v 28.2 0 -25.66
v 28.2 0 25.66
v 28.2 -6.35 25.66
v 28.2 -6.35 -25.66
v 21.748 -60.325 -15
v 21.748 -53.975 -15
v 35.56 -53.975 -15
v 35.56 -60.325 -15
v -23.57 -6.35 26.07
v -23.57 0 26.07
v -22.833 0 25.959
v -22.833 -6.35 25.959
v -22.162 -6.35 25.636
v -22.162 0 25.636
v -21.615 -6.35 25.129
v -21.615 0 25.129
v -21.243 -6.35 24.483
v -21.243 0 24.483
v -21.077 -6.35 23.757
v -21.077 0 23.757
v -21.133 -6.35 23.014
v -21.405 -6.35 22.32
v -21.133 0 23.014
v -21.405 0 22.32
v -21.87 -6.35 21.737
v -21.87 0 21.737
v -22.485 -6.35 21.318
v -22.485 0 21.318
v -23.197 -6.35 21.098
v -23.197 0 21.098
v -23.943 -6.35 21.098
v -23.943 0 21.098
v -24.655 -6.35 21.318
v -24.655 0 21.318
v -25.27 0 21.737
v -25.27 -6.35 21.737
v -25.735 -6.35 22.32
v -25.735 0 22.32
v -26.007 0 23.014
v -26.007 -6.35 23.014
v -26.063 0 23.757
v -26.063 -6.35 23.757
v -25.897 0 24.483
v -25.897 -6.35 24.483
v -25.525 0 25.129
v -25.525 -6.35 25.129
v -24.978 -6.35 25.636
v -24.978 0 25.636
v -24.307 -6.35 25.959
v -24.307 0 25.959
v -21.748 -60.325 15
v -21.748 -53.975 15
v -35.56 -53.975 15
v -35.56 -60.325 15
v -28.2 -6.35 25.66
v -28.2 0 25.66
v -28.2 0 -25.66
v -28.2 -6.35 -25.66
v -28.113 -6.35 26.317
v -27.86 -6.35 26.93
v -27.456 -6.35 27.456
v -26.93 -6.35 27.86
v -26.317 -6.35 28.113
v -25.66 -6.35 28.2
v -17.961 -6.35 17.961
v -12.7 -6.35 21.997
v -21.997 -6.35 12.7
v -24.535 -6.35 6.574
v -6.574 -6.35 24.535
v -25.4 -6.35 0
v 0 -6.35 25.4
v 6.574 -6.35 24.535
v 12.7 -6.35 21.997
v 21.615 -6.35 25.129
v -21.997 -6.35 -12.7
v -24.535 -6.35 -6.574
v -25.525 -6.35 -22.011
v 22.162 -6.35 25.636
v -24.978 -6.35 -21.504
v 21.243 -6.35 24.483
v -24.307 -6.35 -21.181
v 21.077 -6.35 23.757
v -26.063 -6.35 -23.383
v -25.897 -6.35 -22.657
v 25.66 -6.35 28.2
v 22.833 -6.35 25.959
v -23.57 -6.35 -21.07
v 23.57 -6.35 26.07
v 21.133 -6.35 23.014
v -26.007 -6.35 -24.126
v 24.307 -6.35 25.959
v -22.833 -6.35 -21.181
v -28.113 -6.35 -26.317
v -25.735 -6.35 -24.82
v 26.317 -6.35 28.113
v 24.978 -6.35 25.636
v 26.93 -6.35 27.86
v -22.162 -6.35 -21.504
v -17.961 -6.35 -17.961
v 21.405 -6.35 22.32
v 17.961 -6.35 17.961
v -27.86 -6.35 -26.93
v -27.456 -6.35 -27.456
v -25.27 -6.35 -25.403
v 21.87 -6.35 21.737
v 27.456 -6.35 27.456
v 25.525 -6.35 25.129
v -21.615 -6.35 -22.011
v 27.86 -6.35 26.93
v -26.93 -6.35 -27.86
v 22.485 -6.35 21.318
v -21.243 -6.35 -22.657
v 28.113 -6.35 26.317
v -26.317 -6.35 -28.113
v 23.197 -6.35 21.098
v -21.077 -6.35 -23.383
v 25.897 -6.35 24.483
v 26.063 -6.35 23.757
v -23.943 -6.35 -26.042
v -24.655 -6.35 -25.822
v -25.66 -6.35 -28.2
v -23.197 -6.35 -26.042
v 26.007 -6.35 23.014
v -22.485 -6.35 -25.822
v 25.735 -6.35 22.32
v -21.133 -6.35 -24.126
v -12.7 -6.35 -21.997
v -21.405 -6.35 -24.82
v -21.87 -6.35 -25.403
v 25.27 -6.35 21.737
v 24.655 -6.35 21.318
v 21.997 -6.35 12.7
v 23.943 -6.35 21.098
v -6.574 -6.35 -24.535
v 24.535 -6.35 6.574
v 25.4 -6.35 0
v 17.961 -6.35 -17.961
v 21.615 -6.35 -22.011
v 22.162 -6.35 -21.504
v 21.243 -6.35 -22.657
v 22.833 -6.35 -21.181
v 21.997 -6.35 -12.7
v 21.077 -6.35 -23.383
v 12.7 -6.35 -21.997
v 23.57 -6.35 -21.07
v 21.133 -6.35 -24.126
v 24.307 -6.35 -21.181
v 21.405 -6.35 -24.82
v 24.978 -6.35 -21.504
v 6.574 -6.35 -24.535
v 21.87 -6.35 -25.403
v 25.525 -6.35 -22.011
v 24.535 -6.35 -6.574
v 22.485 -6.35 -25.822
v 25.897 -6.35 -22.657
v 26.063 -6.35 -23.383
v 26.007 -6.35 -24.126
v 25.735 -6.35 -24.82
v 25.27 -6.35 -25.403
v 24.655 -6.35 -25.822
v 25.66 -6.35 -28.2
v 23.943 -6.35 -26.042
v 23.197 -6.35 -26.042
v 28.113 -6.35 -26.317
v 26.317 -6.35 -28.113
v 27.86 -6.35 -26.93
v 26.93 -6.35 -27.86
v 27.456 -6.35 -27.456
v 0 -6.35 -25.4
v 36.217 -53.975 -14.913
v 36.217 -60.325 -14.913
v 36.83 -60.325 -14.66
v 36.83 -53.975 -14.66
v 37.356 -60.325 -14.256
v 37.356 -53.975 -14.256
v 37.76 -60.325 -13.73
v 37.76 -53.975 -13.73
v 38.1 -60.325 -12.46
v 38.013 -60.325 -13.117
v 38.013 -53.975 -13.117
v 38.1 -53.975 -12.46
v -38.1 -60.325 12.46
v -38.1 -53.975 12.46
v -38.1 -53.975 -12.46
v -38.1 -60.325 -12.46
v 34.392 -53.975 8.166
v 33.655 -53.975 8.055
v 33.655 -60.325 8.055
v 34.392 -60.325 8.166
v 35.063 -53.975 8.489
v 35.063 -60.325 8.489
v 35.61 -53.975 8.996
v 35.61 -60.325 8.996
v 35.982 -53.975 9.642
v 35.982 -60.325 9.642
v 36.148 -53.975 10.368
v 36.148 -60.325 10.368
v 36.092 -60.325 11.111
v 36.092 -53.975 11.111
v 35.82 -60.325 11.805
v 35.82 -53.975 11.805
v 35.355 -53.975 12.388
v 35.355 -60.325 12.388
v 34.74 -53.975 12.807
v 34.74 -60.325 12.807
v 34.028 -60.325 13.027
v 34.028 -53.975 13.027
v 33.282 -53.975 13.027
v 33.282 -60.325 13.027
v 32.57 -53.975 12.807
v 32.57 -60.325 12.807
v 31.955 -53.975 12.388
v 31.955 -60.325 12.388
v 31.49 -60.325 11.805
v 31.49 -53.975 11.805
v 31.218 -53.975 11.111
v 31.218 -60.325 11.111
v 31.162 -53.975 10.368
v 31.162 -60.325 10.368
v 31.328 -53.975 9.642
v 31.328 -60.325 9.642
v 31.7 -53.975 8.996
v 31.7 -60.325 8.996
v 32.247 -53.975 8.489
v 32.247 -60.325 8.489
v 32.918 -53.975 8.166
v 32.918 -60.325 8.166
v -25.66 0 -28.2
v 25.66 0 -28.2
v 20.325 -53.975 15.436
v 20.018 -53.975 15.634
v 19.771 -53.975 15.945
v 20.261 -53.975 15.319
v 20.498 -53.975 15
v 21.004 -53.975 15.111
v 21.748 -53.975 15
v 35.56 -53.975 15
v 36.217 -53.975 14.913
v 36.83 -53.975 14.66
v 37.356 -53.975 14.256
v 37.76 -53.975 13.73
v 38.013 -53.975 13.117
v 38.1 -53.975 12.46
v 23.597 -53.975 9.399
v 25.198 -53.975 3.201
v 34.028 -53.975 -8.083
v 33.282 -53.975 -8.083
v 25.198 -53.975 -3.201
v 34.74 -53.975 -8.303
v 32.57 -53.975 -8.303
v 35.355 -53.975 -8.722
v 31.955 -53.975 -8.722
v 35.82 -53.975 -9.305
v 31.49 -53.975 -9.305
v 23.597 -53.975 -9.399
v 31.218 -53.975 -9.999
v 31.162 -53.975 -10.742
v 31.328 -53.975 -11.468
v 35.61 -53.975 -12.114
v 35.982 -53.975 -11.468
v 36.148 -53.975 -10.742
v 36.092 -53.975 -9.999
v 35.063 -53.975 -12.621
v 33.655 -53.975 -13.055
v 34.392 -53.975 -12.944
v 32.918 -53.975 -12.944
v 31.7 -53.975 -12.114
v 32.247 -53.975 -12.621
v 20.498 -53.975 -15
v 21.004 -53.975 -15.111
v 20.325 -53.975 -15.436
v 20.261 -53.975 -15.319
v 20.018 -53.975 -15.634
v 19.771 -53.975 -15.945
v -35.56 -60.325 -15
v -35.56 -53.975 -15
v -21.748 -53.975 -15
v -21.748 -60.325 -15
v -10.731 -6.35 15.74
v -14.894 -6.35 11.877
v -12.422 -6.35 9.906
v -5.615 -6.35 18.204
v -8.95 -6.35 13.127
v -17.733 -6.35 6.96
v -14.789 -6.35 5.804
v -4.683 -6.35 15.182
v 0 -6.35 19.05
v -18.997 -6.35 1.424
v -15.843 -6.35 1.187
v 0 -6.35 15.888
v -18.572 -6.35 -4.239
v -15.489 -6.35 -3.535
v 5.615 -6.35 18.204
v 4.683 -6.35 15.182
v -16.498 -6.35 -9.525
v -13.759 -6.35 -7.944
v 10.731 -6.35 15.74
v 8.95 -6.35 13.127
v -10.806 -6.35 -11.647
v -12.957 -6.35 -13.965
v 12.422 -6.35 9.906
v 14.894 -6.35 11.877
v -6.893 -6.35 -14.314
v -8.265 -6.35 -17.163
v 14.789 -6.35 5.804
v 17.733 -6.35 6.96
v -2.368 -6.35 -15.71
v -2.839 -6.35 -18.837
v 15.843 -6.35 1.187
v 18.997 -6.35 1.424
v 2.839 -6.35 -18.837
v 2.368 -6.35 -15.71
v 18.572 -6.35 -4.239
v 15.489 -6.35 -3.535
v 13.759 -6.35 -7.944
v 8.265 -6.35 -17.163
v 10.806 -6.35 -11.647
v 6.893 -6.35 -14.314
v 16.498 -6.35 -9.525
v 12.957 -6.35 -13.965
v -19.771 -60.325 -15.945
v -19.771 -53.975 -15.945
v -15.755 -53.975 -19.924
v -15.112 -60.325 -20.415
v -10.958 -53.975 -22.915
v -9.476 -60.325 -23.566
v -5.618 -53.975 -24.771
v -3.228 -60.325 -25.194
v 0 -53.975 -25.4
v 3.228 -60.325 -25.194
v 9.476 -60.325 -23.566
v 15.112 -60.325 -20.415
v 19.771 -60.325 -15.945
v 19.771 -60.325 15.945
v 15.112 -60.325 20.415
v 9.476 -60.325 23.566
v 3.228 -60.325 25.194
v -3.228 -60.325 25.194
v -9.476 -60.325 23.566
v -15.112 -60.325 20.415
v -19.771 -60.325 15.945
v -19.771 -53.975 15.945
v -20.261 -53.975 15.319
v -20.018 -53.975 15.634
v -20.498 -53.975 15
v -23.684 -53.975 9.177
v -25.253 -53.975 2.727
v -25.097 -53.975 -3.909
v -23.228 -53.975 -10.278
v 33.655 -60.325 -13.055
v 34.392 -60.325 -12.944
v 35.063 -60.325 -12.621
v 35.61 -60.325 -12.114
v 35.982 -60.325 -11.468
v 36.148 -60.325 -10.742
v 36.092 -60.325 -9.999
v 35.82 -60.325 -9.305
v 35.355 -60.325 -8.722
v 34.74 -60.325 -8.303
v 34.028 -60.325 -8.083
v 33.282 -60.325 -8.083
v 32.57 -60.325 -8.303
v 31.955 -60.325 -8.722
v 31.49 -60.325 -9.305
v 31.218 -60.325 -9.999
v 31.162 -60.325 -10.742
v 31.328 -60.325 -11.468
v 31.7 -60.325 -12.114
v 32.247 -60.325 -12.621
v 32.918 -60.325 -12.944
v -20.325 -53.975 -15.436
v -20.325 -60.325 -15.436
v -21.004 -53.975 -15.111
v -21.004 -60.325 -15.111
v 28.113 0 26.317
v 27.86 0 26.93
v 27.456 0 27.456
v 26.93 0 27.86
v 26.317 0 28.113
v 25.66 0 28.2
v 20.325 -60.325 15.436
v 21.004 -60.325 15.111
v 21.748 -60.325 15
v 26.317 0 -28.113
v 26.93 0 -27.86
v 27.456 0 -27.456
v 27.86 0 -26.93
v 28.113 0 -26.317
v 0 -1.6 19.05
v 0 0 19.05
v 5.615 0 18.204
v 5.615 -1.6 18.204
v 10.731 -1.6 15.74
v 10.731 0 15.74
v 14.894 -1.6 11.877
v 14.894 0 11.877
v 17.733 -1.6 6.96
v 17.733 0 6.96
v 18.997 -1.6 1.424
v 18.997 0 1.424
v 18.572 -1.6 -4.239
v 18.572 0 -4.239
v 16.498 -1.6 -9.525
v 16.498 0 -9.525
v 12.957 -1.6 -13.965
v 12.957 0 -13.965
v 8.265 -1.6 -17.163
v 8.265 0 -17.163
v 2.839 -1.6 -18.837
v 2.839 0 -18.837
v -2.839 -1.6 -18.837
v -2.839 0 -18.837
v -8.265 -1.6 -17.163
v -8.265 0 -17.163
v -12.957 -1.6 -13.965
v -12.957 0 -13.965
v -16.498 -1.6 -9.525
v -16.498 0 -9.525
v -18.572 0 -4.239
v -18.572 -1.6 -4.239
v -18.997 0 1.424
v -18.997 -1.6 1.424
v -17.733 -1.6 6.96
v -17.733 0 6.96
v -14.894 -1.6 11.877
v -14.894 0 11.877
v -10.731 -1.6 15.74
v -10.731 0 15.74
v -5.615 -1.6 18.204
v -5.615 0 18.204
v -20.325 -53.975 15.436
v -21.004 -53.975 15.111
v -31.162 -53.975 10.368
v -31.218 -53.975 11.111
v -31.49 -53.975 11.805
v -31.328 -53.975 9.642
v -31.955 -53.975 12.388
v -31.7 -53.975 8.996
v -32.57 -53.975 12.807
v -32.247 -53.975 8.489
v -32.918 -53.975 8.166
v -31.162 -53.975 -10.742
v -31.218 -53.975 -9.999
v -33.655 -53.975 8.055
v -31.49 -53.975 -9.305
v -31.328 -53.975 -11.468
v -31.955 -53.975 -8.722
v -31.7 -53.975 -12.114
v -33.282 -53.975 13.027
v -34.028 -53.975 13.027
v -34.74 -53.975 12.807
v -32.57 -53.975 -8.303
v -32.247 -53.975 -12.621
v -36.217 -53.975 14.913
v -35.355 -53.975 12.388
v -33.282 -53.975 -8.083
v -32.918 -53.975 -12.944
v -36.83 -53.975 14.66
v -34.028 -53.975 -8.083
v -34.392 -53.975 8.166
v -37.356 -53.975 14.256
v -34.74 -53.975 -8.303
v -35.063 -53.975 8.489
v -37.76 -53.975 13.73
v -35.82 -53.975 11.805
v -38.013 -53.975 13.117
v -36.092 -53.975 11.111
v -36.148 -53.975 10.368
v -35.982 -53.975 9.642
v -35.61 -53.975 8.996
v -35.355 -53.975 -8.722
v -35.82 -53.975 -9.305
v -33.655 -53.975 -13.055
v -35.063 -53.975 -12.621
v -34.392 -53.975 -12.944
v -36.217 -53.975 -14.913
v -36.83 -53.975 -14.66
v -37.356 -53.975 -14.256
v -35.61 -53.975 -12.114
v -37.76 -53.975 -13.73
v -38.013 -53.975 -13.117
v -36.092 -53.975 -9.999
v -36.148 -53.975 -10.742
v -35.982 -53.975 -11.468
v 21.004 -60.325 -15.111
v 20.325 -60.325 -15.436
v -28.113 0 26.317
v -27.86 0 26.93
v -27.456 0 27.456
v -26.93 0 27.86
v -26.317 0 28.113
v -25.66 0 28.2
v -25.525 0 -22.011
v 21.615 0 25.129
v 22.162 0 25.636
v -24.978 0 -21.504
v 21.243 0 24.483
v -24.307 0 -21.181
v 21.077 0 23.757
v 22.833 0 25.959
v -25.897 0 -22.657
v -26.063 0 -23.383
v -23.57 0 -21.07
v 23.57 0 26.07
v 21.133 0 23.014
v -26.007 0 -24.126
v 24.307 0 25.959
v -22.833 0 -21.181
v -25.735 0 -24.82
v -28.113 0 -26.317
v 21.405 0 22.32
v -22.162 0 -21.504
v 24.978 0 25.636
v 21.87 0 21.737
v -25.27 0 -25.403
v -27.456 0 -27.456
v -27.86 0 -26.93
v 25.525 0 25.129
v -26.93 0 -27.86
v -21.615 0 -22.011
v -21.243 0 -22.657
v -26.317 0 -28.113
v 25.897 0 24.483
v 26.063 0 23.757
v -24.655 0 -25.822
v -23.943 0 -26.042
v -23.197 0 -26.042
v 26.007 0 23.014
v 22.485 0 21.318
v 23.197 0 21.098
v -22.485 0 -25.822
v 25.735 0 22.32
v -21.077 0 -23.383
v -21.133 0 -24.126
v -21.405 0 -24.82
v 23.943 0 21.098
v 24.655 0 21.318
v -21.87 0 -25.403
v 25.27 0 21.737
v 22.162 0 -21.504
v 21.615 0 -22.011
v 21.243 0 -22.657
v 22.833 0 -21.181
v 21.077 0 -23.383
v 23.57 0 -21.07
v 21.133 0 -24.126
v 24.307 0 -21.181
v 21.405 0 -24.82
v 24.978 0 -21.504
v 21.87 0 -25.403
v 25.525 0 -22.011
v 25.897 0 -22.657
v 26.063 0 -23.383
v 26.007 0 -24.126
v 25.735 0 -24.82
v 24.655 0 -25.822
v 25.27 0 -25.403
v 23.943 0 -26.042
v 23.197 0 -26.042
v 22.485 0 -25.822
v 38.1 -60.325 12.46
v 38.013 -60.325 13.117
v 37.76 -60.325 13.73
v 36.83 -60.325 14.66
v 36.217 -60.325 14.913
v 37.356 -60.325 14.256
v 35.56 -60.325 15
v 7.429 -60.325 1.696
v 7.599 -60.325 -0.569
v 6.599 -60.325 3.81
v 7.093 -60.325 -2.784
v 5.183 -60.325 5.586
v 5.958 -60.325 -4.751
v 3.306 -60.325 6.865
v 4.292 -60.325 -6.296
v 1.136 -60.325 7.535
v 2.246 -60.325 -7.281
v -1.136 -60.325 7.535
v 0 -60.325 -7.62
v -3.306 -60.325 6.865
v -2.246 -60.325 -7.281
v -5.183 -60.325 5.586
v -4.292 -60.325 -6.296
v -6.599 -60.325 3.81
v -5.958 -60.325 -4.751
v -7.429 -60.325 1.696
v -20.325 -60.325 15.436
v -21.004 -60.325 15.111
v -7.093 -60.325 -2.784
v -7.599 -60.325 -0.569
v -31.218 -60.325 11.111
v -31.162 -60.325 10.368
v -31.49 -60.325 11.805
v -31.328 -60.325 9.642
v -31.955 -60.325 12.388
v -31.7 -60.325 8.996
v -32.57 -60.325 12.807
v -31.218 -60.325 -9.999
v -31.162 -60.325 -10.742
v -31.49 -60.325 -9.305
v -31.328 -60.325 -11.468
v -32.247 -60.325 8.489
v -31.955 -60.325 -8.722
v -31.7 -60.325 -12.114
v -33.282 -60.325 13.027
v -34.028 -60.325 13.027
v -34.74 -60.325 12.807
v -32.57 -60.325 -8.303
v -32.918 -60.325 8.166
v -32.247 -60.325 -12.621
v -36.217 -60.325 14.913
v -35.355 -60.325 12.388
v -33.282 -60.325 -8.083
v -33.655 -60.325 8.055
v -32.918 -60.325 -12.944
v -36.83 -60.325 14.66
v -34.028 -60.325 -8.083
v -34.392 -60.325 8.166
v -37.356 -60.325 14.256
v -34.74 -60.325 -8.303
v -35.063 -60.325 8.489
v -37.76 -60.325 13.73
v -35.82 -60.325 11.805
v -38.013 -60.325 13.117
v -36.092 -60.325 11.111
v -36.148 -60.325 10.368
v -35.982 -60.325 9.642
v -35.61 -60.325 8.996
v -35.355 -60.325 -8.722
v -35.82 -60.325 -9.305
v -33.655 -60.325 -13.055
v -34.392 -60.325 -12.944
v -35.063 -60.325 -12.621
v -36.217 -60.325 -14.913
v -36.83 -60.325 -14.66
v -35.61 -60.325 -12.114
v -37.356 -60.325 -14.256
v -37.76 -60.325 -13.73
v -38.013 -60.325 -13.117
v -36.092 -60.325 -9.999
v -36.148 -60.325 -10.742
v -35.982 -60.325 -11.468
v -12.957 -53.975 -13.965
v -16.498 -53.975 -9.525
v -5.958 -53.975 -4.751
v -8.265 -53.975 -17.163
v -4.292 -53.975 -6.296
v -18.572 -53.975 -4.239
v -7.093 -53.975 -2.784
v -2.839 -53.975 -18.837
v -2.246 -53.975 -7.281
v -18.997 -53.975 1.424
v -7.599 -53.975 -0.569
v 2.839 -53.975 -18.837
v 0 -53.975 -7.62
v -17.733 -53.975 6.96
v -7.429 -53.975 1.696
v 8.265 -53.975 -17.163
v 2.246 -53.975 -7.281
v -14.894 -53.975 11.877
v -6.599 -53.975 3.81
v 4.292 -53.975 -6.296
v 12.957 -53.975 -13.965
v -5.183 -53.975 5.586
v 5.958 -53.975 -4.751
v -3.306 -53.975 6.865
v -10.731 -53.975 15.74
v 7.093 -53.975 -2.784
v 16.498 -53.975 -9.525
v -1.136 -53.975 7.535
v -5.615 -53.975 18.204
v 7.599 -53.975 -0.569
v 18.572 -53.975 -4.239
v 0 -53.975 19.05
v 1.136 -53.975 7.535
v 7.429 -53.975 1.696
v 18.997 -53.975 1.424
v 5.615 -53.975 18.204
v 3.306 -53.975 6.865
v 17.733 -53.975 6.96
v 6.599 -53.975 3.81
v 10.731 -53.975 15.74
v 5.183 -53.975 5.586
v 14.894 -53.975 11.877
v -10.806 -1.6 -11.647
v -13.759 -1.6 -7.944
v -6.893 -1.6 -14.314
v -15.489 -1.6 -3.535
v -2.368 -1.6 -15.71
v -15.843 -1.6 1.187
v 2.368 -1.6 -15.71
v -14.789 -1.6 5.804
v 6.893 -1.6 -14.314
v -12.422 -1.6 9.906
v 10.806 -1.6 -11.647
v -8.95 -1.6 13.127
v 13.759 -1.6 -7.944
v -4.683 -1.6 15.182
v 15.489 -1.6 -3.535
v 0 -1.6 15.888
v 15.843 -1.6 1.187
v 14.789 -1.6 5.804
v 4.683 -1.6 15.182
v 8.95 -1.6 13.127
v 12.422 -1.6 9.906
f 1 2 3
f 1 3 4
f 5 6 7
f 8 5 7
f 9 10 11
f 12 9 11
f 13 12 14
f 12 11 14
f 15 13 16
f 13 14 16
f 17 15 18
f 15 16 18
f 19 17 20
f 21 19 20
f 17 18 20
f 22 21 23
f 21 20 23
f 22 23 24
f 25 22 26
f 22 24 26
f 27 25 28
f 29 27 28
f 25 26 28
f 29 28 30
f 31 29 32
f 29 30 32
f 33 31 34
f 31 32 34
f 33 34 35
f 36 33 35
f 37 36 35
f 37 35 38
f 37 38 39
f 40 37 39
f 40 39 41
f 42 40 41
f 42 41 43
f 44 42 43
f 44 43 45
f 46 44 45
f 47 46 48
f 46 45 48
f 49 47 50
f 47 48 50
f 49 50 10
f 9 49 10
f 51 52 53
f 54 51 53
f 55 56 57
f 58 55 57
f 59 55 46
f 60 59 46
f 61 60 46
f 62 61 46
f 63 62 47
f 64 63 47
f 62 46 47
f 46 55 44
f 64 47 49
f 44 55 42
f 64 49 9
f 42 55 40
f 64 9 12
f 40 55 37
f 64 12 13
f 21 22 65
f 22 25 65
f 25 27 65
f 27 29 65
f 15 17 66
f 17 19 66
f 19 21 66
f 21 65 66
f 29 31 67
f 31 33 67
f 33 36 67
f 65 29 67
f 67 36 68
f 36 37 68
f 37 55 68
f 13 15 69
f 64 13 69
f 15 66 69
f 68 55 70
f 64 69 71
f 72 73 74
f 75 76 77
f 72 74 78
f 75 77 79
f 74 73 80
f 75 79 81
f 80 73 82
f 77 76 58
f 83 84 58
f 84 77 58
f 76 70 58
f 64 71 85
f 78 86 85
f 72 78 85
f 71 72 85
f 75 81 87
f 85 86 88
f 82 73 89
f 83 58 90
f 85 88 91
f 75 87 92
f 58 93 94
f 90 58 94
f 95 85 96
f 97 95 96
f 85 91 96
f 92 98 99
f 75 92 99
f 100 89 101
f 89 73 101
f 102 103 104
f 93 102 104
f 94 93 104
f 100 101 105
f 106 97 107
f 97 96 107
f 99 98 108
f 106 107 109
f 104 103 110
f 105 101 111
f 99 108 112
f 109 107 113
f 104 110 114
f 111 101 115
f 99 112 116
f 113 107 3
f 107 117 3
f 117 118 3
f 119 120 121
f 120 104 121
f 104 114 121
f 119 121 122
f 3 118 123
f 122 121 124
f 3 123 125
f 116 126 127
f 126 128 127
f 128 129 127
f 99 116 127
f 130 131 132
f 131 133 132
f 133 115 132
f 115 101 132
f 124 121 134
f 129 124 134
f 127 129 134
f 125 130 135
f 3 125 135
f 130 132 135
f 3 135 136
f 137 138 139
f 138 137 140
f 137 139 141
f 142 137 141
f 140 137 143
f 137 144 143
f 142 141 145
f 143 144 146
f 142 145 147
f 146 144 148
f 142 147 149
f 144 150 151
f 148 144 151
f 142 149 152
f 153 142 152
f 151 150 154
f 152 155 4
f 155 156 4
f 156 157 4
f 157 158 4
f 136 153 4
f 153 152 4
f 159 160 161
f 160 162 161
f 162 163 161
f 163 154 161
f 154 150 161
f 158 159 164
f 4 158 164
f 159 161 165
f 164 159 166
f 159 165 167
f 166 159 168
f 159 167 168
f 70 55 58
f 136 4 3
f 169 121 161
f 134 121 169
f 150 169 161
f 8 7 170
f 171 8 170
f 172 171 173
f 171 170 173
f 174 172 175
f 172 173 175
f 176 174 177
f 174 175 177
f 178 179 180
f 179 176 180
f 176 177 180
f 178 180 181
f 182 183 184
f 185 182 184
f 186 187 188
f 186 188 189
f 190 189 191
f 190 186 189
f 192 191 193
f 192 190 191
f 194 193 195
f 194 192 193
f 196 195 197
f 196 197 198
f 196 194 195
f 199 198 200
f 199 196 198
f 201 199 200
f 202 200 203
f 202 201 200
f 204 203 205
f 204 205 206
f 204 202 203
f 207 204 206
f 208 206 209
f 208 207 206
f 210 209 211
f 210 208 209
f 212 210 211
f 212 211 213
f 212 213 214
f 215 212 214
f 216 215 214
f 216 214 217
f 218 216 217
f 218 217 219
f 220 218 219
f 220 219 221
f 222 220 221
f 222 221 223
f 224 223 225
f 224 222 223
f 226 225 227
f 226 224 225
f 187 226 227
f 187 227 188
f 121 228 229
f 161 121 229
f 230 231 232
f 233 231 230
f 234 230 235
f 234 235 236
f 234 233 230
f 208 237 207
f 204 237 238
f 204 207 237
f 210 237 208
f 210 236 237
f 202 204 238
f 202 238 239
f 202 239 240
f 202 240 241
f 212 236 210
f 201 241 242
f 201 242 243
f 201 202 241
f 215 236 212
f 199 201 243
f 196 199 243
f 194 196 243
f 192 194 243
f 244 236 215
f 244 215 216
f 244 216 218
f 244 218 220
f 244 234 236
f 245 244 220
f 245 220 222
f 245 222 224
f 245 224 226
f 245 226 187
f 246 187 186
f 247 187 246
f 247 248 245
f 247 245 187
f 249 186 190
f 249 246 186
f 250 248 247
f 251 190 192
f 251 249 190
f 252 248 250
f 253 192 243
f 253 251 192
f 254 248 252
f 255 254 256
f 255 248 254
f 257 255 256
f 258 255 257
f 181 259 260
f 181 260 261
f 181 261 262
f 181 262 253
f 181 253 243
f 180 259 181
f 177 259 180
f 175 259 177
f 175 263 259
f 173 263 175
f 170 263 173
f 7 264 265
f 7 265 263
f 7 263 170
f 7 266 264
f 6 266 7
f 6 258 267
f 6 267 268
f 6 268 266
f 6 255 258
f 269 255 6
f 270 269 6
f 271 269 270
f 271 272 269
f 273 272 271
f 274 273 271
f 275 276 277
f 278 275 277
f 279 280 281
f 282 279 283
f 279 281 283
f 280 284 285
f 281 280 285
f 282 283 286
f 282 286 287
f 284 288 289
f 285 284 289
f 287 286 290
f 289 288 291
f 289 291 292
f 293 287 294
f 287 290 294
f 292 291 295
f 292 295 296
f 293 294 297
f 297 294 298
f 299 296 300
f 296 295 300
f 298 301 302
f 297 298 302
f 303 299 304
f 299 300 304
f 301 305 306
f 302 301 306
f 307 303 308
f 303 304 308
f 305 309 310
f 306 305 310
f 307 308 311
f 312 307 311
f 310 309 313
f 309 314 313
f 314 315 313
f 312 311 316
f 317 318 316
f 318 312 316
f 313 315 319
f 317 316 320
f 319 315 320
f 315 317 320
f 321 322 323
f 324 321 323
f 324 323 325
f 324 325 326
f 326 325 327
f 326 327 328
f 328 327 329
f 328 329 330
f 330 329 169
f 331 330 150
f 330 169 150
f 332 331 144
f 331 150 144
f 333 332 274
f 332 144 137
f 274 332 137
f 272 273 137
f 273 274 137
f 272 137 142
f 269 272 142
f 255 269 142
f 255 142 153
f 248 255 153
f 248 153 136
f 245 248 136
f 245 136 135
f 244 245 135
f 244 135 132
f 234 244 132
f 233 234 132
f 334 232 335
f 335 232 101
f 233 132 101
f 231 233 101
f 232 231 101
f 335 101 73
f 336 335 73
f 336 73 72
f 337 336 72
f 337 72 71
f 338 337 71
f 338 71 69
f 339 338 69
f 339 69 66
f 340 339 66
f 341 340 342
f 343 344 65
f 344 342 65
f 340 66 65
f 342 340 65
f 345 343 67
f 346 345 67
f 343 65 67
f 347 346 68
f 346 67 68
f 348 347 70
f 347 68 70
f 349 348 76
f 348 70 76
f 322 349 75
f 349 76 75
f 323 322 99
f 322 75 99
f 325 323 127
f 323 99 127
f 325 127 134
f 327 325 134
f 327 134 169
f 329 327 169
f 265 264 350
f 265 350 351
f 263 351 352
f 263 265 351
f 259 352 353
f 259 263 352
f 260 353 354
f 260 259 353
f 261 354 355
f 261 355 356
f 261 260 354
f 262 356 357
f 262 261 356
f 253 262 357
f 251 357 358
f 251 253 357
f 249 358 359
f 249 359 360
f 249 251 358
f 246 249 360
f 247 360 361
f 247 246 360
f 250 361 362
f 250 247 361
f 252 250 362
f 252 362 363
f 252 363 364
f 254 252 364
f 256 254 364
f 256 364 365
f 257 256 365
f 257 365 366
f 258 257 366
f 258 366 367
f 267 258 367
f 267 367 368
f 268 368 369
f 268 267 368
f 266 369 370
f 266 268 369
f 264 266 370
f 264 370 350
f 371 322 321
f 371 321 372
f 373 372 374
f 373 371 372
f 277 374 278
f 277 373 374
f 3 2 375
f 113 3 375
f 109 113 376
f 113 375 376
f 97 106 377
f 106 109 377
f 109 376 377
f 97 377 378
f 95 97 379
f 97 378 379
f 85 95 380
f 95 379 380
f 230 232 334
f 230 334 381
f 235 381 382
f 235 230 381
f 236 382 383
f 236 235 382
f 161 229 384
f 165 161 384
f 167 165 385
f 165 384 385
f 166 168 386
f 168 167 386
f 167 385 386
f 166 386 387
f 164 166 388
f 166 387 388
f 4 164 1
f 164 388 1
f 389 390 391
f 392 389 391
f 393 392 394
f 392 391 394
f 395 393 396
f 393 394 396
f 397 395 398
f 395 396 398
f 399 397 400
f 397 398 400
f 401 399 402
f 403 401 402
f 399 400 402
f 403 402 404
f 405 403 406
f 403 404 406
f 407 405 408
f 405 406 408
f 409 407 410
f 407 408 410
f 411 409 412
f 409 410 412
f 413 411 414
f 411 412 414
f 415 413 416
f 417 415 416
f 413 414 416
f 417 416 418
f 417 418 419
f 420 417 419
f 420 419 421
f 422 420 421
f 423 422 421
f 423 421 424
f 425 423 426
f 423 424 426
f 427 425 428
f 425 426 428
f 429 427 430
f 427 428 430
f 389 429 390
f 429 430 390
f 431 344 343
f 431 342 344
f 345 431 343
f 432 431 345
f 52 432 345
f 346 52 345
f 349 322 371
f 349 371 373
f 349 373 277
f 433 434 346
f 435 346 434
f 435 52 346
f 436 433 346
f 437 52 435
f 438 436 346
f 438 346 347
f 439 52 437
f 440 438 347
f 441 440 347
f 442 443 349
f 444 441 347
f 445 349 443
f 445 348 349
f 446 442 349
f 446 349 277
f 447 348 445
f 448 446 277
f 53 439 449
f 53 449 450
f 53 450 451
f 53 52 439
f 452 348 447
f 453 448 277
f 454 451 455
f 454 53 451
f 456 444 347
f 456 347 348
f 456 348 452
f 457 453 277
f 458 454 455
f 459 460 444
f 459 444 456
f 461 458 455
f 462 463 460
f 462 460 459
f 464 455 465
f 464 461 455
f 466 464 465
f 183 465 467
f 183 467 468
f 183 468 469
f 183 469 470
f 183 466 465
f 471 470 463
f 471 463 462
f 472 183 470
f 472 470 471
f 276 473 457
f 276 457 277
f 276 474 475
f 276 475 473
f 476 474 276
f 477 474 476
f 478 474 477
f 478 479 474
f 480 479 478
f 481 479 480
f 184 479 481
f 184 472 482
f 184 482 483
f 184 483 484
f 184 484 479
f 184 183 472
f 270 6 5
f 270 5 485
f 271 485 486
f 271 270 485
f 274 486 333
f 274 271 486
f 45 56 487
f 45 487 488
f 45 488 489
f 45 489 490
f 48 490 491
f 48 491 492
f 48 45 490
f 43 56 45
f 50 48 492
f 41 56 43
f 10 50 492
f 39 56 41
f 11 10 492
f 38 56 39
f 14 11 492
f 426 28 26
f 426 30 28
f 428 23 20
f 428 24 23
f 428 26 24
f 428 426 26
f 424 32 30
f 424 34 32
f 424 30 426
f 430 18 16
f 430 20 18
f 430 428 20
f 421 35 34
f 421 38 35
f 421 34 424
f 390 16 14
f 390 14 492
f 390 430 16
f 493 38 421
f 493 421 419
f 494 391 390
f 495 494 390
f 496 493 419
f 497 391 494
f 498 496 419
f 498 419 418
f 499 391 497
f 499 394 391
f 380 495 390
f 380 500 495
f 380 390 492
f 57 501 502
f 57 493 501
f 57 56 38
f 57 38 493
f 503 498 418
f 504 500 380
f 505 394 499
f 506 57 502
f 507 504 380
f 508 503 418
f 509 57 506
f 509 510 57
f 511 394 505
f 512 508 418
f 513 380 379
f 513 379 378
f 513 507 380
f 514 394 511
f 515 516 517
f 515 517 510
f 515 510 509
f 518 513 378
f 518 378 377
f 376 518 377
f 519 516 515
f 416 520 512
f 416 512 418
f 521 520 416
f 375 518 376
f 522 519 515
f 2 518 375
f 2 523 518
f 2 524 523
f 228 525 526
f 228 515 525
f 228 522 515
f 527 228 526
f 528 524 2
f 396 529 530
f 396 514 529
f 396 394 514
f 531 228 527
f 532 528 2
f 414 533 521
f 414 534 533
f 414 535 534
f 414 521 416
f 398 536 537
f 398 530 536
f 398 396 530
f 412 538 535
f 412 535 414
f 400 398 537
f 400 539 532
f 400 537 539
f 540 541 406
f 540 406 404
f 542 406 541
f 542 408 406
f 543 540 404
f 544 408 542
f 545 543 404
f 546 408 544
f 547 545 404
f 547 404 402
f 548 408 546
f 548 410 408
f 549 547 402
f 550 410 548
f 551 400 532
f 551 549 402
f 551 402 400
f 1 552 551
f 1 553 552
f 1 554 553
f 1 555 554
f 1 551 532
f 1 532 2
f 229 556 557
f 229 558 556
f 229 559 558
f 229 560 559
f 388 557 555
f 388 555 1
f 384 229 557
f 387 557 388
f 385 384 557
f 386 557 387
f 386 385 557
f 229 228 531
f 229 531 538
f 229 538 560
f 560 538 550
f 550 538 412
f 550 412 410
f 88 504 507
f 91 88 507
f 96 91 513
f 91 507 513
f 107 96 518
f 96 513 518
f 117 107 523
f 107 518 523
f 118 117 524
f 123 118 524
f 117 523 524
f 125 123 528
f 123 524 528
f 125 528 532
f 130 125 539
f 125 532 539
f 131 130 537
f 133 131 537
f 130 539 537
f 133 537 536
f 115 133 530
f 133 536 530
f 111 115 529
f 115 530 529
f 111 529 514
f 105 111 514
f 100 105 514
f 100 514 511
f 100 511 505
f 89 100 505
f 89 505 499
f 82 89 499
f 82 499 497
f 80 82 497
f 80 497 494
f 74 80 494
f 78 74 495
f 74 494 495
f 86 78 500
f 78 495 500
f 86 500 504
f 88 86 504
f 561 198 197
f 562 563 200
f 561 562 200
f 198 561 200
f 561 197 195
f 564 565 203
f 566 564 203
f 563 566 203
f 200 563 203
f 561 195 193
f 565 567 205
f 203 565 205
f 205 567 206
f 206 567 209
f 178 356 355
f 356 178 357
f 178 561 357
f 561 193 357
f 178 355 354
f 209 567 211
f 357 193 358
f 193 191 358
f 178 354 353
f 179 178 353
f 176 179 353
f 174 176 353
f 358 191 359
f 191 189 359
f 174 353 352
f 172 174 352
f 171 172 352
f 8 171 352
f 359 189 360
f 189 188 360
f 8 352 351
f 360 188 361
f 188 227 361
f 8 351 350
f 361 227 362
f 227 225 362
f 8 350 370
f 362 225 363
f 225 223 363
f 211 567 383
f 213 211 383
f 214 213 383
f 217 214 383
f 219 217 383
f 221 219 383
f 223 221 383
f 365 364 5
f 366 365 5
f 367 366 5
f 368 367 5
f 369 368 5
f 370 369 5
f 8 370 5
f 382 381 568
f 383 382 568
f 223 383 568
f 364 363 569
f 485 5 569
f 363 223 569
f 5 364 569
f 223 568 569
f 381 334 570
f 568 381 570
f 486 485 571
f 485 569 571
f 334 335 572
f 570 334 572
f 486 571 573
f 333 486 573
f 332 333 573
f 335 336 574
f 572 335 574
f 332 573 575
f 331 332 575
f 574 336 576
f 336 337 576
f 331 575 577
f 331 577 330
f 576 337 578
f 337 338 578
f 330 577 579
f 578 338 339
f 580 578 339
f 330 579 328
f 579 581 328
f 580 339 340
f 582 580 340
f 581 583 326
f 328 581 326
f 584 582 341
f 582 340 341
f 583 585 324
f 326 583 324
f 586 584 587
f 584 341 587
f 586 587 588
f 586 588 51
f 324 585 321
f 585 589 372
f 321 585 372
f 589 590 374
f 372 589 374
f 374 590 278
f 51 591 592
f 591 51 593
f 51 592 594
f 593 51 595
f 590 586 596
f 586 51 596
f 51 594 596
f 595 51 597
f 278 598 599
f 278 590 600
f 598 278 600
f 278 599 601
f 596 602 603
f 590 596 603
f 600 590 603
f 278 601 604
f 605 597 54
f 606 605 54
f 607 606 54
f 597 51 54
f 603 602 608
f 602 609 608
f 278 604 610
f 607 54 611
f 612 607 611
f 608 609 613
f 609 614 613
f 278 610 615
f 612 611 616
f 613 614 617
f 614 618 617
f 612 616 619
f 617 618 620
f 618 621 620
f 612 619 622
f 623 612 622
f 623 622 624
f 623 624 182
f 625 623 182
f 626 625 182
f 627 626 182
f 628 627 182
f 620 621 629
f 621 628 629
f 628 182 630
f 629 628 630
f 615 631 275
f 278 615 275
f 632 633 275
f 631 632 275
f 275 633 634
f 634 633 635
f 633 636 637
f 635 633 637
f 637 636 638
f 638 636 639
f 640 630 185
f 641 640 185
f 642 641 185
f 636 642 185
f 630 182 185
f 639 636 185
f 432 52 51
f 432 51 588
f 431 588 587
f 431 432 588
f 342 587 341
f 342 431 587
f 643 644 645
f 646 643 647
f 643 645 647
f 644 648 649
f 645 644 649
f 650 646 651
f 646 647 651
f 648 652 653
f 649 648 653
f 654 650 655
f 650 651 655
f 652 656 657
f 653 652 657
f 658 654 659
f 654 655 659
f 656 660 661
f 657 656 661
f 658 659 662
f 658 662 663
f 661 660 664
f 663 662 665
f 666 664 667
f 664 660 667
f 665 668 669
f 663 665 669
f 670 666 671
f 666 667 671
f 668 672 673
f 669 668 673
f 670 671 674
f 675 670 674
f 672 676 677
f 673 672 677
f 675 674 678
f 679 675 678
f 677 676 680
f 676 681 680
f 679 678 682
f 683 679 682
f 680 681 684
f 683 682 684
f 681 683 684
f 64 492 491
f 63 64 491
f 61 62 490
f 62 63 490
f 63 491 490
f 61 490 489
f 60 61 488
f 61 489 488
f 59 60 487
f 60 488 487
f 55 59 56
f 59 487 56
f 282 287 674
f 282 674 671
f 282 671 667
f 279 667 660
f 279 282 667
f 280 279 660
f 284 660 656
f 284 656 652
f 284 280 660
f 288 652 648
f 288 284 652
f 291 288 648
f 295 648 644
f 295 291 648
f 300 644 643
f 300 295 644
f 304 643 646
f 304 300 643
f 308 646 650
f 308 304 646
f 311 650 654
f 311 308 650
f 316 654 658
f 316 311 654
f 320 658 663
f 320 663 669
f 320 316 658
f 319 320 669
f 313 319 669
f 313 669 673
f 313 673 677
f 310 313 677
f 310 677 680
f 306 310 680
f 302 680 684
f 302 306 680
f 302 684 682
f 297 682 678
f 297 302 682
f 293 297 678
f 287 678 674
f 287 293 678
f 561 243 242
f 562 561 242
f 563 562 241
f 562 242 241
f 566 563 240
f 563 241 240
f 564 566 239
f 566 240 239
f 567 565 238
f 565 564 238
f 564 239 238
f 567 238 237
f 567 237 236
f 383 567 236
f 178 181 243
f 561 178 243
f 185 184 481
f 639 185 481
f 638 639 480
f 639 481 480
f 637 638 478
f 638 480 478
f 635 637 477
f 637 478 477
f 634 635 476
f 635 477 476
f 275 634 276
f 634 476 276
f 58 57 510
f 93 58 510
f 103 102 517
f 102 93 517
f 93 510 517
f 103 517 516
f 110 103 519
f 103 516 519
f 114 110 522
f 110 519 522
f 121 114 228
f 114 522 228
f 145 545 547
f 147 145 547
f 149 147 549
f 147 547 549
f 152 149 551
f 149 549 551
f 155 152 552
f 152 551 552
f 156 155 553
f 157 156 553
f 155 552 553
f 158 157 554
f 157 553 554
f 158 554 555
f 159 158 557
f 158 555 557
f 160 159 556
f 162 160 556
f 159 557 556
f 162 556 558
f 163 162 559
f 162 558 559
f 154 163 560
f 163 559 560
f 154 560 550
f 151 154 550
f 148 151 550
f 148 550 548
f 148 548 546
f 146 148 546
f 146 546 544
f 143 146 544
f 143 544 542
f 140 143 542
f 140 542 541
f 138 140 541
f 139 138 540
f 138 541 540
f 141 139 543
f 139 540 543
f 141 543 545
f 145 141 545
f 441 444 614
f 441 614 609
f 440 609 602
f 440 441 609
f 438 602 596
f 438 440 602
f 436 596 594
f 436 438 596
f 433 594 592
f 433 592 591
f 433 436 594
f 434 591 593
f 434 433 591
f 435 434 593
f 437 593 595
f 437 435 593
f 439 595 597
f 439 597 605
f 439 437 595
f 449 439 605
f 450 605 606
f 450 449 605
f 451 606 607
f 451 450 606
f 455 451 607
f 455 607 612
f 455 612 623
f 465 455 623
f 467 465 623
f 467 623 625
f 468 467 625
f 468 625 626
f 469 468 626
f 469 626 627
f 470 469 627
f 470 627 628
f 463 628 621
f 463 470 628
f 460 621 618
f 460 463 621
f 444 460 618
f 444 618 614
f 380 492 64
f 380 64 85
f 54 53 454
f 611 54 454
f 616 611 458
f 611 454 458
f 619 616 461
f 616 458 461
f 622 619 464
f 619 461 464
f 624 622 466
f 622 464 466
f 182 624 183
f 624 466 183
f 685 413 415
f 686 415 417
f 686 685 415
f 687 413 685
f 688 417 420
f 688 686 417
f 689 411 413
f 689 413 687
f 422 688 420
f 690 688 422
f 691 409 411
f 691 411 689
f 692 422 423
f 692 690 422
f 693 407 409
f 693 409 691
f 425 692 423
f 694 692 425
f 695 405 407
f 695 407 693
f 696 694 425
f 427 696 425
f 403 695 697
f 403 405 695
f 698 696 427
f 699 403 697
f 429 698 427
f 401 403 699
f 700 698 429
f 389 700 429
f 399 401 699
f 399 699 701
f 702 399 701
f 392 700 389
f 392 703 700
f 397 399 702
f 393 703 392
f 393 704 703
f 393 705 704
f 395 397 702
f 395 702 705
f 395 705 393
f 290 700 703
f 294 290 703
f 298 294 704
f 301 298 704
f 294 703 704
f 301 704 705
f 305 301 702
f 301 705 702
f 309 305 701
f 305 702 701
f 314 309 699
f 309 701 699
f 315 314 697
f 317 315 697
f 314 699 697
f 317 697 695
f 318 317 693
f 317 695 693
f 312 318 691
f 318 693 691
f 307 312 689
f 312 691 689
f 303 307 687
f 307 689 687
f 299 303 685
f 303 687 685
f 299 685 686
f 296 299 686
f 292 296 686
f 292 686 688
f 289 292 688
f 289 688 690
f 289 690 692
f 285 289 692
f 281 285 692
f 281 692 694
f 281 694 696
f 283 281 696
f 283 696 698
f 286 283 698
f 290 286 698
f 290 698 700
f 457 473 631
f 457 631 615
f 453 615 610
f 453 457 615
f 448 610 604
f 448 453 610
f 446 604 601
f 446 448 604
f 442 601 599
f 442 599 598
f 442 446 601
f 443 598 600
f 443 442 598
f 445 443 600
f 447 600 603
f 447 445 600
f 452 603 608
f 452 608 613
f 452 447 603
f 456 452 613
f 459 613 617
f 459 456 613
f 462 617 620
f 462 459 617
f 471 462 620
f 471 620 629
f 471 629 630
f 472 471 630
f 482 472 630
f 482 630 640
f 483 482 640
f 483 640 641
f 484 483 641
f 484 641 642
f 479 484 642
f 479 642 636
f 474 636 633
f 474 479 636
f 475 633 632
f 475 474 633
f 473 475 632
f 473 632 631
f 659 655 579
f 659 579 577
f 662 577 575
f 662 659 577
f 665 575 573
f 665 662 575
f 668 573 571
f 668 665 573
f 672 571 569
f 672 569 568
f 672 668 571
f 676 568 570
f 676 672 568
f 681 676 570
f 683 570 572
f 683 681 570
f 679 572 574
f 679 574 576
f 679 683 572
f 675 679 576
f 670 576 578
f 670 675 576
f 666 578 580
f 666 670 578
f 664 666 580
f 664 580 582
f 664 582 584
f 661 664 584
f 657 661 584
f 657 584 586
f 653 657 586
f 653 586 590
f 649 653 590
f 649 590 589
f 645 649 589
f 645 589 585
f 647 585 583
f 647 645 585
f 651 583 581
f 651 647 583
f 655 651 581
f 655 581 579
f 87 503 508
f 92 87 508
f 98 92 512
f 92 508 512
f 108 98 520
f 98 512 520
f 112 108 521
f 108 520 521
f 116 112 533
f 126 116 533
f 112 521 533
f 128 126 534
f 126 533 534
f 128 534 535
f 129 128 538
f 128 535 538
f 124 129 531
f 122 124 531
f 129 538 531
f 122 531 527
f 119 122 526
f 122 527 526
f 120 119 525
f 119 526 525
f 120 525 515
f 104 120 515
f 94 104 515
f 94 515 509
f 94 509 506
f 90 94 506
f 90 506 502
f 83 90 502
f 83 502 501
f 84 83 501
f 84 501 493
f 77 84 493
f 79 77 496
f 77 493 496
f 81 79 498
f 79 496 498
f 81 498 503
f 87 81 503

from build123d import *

# Parameters (mm, degrees)
SKETCH2_W           = 56.399999976
SKETCH2_H           = 56.399999976
SKETCH2_R           = 15.8877
SKETCH2_R_2         = 2.499999953
BOSS_EXTRUDE1_DEPTH = 6.35
SKETCH2_4_R         = 19.05
SKETCH2_4_R_2       = 15.8877
CUT_EXTRUDE2_DEPTH  = 1.600000102
SKETCH3_R           = 25.4
SKETCH3_R_2         = 19.05
BOSS_EXTRUDE2_DEPTH = 47.625
SKETCH4_R           = 2.5
SKETCH4_R_2         = 7.62
BOSS_EXTRUDE3_DEPTH = 6.35
FILLET1_R           = 2.54


with BuildPart() as part:
    # Sketch2 → Boss-Extrude1 (new body)
    with BuildSketch(Plane(origin=(0, 0, 0), x_dir=(1, 0, 0), z_dir=(0, 1, 0))):
        Rectangle(SKETCH2_W, SKETCH2_H)
        with Locations(Location((0, 0, 0), (0, 0, 270))):
            Circle(SKETCH2_R, mode=Mode.SUBTRACT)
        with Locations(Location((23.569999977, 23.569999977, 0), (0, 0, 270))):
            Circle(SKETCH2_R_2, mode=Mode.SUBTRACT)
        with Locations(Location((23.569999977, -23.569999977, 0), (0, 0, 270))):
            Circle(SKETCH2_R_2, mode=Mode.SUBTRACT)
        with Locations(Location((-23.569999977, -23.569999977, 0), (0, 0, 270))):
            Circle(SKETCH2_R_2, mode=Mode.SUBTRACT)
        with Locations(Location((-23.569999977, 23.569999977, 0), (0, 0, 270))):
            Circle(SKETCH2_R_2, mode=Mode.SUBTRACT)
    extrude(amount=-BOSS_EXTRUDE1_DEPTH)

    # Sketch2<4> → Cut-Extrude2 (cut)
    with BuildSketch(Plane(origin=(0, 0, 0), x_dir=(1, 0, 0), z_dir=(0, 1, 0))):
        with Locations(Location((0, 0, 0), (0, 0, 270))):
            Circle(SKETCH2_4_R)
        with Locations(Location((0, 0, 0), (0, 0, 270))):
            Circle(SKETCH2_4_R_2, mode=Mode.SUBTRACT)
    extrude(amount=-CUT_EXTRUDE2_DEPTH, mode=Mode.SUBTRACT)

    # Sketch3 → Boss-Extrude2 (add)
    with BuildSketch(Plane.XZ.offset(6.35)):
        with Locations(Location((0, 0, 0), (0, 0, 270))):
            Circle(SKETCH3_R)
        with Locations(Location((0, 0, 0), (0, 0, 90))):
            Circle(SKETCH3_R_2, mode=Mode.SUBTRACT)
    extrude(amount=BOSS_EXTRUDE2_DEPTH)

    # Sketch4 → Boss-Extrude3 (add)
    with BuildSketch(Plane.XZ.offset(53.975)):
        with BuildLine():
            Line((38.1, -14.999999972), (38.1, 14.999999972))
            Line((38.1, 14.999999972), (20.497804781, 14.999999972))
            ThreePointArc((20.497804781, 14.999999972), (0, 25.4), (-20.497804781, 14.999999972))
            Line((-20.497804781, 14.999999972), (-38.1, 14.999999972))
            Line((-38.1, 14.999999972), (-38.1, -14.999999972))
            Line((-38.1, -14.999999972), (-20.497804781, -14.999999972))
            ThreePointArc((-20.497804781, -14.999999972), (0, -25.4), (20.497804781, -14.999999972))
            Line((20.497804781, -14.999999972), (38.1, -14.999999972))
        make_face()
        with Locations(Location((-33.655, -10.554999972, 0), (0, 0, 270))):
            Circle(SKETCH4_R, mode=Mode.SUBTRACT)
        with Locations(Location((0, 0, 0), (0, 0, 270))):
            Circle(SKETCH4_R_2, mode=Mode.SUBTRACT)
        with Locations(Location((-33.655, 10.554999972, 0), (0, 0, 270))):
            Circle(SKETCH4_R, mode=Mode.SUBTRACT)
        with Locations(Location((33.655, -10.554999972, 0), (0, 0, 270))):
            Circle(SKETCH4_R, mode=Mode.SUBTRACT)
        with Locations(Location((33.655, 10.554999972, 0), (0, 0, 270))):
            Circle(SKETCH4_R, mode=Mode.SUBTRACT)
    extrude(amount=BOSS_EXTRUDE3_DEPTH)

    # Fillet1
    # the kernel refuses this fillet: 2.54 mm, written as the material it adds along each edge
    with BuildSketch(Plane(origin=(20.497804781, -53.975, 14.999999972), x_dir=(-0.6093303633188096, 0, 0.7929164573508154), z_dir=(0, -1, 0)), Plane(origin=(-20.497804781, -53.975, -14.999999972), x_dir=(0.609330363318784, 0, -0.7929164573508352), z_dir=(0, -1, 0))) as fillet1_piece_1:
        with BuildLine():
            CenterArc((1.251994792, -2.539300218), FILLET1_R, 91.344968241, 51.113932151)
            Line((-0.762013009, -0.991601095), (0, 0))
            ThreePointArc((0, 0), (0.596187996, -0.006997817), (1.192375993, 0))
        make_face()
    extrude(amount=6.35)
    with BuildSketch(Plane(origin=(-20.497804781, -53.975, 14.999999972), x_dir=(0.6093303633187793, 0, 0.7929164573508387), z_dir=(0, -1, 0)), Plane(origin=(20.497804781, -53.975, -14.999999972), x_dir=(-0.609330363318815, 0, -0.7929164573508114), z_dir=(0, -1, 0))) as fillet1_piece_2:
        with BuildLine():
            CenterArc((1.251994792, 2.539300218), FILLET1_R, 217.541099608, 51.113932151)
            Line((-0.762013009, 0.991601095), (0, 0))
            ThreePointArc((0, 0), (0.596187996, 0.006997817), (1.192375993, 0))
        make_face()
    extrude(amount=6.35)
    # the kernel refuses this fillet: 2.54 mm, written as the material it takes off along each edge
    with BuildSketch(Plane(origin=(-28.199999988, 6.35, -28.199999988), x_dir=(0, 0, 1), z_dir=(0, -1, 0)), Plane(origin=(-28.199999988, 6.35, 28.199999988), x_dir=(1, 0, 0), z_dir=(0, -1, 0)), Plane(origin=(38.1, -47.625, -14.999999972), x_dir=(-1, 0, 0), z_dir=(0, -1, 0)), Plane(origin=(38.1, -47.625, 14.999999972), x_dir=(0, 0, -1), z_dir=(0, -1, 0))) as fillet1_2_piece_1:
        with BuildLine():
            CenterArc((FILLET1_R, -FILLET1_R), FILLET1_R, 90, 90)
            Line((0, -FILLET1_R), (0, 0))
            Line((0, 0), (FILLET1_R, 0))
        make_face()
    extrude(amount=19.05, mode=Mode.SUBTRACT)
    with BuildSketch(Plane(origin=(28.199999988, 6.35, -28.199999988), x_dir=(0, 0, 1), z_dir=(0, -1, 0)), Plane(origin=(28.199999988, 6.35, 28.199999988), x_dir=(-1, 0, 0), z_dir=(0, -1, 0)), Plane(origin=(-38.1, -47.625, 14.999999972), x_dir=(0, 0, -1), z_dir=(0, -1, 0)), Plane(origin=(-38.1, -47.625, -14.999999972), x_dir=(1, 0, 0), z_dir=(0, -1, 0))) as fillet1_2_piece_2:
        with BuildLine():
            CenterArc((FILLET1_R, FILLET1_R), FILLET1_R, 180, 90)
            Line((0, FILLET1_R), (0, 0))
            Line((0, 0), (FILLET1_R, 0))
        make_face()
    extrude(amount=19.05, mode=Mode.SUBTRACT)


solid = part.part
